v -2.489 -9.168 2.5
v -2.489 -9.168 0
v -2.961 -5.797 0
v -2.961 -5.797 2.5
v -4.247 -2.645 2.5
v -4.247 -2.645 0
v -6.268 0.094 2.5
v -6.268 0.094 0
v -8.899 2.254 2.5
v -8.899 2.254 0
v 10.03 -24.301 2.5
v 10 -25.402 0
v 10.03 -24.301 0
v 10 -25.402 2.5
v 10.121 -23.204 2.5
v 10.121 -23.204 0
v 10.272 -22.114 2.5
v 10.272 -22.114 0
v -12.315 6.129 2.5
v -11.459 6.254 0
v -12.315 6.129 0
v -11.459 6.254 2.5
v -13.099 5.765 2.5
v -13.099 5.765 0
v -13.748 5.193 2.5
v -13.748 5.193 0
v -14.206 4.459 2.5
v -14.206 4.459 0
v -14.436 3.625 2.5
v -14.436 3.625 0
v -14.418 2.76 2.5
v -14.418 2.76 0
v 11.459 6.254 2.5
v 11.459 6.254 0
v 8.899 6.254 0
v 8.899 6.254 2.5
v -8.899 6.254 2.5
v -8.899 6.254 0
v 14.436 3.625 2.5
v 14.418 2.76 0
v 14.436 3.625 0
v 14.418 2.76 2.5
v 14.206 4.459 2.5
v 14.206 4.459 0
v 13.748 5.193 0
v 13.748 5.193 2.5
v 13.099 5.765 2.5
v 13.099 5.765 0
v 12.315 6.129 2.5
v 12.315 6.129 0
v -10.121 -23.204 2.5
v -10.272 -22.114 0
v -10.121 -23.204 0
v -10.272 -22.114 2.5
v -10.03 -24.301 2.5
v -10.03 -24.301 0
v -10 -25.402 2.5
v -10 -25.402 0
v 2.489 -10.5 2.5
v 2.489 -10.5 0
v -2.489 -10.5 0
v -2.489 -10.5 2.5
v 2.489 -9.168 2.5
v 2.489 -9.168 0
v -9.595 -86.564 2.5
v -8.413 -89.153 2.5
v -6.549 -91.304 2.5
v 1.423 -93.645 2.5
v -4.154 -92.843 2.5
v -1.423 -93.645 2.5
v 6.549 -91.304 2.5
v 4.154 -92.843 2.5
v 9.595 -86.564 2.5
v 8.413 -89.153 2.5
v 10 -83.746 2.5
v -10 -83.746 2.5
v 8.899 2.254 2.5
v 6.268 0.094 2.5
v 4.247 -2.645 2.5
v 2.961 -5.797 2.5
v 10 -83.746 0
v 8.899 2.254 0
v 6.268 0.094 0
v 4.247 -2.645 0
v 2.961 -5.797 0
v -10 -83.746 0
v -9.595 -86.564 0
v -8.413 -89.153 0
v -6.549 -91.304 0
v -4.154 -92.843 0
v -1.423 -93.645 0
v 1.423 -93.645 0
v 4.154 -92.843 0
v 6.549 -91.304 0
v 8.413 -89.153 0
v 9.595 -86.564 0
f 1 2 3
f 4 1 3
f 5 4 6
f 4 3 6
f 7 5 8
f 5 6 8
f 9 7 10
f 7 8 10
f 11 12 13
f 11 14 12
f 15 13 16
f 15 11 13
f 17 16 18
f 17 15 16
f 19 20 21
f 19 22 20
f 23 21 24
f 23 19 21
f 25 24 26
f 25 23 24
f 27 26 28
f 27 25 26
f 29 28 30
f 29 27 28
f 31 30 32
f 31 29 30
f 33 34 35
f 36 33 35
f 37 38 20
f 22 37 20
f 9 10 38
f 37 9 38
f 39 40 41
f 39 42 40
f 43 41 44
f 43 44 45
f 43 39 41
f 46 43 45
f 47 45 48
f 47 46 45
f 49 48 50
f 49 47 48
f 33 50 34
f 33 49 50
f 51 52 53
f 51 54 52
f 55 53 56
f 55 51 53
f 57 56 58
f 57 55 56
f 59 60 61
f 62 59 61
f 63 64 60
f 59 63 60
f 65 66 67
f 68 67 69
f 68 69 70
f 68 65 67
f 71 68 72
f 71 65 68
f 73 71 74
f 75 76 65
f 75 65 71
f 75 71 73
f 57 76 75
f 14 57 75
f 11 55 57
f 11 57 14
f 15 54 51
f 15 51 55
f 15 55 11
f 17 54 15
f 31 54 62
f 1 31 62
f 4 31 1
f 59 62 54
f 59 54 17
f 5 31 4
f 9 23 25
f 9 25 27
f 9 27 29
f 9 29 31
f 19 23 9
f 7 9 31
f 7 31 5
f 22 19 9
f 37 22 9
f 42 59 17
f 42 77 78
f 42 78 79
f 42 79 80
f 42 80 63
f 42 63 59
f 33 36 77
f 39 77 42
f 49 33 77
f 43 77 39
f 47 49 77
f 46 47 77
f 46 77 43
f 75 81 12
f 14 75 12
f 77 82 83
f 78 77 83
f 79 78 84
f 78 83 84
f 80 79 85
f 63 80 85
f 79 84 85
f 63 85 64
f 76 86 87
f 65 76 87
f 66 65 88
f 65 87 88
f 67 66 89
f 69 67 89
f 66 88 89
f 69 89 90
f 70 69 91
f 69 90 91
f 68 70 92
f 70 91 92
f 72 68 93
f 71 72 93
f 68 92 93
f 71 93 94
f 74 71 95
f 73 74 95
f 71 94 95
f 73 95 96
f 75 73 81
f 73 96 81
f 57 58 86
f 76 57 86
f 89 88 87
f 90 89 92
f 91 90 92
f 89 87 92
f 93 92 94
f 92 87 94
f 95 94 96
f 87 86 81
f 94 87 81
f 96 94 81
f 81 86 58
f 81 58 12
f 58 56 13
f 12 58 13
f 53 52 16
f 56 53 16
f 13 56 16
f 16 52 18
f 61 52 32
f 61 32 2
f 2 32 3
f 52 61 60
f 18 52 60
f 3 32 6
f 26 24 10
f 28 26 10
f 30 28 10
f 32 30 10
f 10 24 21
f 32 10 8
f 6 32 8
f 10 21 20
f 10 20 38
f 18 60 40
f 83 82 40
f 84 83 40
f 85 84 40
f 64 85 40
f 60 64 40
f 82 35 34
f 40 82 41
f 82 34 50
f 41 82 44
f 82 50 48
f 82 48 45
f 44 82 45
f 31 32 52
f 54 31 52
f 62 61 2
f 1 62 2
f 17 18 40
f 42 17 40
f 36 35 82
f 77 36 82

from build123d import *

# Parameters (mm, degrees)
F2_DEPTH = 2.5
F3_R     = 3
F4_R     = 20


with BuildPart() as f2:
    # F1 (on Top) → F2 (new body)
    with BuildSketch(Plane.XY):
        with BuildLine():
            Line((2.488848, -10.5), (-2.488848, -10.5))
            Line((-2.488848, -10.5), (-2.488848, -9.168186))
            ThreePointArc((-2.488848, -9.168186), (-4.247392, -2.645334), (-8.899342, 2.253587))
            Line((-8.899342, 2.253587), (-8.899342, 6.253587))
            Line((-8.899342, 6.253587), (-15, 6.253587))
            Line((-15, 6.253587), (-10, -23.746413))
            Line((-10, -23.746413), (-10, -83.746413))
            ThreePointArc((-10, -83.746413), (0, -93.746413), (10, -83.746413))
            Line((10, -83.746413), (10, -23.746413))
            Line((10, -23.746413), (15, 6.253587))
            Line((15, 6.253587), (8.899342, 6.253587))
            Line((8.899342, 6.253587), (8.899342, 2.253587))
            ThreePointArc((8.899342, 2.253587), (4.247392, -2.645334), (2.488848, -9.168186))
            Line((2.488848, -9.168186), (2.488848, -10.5))
        make_face()
    extrude(amount=F2_DEPTH)

    # F3
    f3_edges = [f2.edges().sort_by_distance(p)[0] for p in [
        (-15, 6.253587, 1.25),
        (15, 6.253587, 1.25),
    ]]
    fillet(f3_edges, radius=F3_R)

    # F4
    f4_edges = [f2.edges().sort_by_distance(p)[0] for p in [
        (-10, -23.746413, 1.25),
        (10, -23.746413, 1.25),
    ]]
    fillet(f4_edges, radius=F4_R)


solid = f2.part
